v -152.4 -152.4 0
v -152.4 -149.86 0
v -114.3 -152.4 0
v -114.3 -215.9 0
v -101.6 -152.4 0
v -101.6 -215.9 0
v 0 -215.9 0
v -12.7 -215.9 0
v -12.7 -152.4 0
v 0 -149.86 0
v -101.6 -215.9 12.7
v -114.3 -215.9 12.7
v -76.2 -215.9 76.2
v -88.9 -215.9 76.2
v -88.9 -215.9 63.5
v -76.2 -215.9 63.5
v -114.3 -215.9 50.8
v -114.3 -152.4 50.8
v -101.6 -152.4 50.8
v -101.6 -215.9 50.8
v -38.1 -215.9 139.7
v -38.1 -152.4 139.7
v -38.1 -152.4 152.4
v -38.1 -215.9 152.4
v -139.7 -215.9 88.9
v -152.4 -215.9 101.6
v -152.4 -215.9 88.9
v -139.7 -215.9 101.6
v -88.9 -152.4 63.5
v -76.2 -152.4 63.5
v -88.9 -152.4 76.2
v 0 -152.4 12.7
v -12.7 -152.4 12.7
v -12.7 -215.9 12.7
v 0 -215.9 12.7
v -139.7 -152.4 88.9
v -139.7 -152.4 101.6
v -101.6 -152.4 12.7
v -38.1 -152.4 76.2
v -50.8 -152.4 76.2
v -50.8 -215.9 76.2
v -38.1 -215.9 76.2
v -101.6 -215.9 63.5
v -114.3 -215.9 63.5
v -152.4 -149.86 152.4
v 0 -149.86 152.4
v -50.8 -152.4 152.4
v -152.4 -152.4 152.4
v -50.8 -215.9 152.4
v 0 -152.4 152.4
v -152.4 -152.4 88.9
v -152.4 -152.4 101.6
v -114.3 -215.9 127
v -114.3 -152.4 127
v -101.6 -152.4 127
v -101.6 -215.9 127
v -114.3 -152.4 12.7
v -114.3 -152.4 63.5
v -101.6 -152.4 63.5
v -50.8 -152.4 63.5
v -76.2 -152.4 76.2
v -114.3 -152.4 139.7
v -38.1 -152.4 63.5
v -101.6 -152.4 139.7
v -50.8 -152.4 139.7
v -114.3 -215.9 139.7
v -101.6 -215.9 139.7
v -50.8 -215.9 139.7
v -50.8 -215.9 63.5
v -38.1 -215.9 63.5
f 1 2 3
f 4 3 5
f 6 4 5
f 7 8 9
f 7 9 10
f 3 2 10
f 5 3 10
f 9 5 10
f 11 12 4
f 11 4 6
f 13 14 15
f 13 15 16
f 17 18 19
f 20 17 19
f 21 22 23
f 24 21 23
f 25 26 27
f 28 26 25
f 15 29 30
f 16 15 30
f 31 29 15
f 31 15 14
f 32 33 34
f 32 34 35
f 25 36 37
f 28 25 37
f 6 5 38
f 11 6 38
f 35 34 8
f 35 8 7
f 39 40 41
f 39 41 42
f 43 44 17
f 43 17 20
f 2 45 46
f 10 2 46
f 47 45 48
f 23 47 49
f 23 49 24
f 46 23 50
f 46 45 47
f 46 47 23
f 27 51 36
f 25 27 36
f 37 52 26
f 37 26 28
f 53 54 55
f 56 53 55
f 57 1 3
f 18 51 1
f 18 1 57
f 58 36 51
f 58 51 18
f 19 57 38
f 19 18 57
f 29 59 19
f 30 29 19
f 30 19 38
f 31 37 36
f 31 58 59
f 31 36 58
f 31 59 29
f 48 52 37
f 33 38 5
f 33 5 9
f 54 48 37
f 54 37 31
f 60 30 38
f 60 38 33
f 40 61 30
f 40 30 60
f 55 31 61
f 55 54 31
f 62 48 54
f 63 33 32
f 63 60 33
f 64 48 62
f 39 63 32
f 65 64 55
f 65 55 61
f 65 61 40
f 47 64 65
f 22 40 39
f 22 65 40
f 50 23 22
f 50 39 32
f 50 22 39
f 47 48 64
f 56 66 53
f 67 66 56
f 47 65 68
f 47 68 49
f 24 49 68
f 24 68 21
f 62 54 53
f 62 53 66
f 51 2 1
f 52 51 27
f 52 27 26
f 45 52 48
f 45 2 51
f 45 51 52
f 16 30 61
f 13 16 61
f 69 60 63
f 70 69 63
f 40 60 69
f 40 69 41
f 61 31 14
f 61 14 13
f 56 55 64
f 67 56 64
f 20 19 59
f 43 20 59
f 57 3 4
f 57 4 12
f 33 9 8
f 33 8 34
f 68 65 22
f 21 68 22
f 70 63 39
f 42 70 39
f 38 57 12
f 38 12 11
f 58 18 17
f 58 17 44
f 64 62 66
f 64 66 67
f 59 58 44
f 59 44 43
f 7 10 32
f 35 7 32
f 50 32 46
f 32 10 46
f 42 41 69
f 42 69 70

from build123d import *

# Parameters (mm, degrees)
F0_W     = 152.4
F0_H     = 152.4
F1_DEPTH = 152.4
F2_W     = 12.7
F2_H     = 12.7
F3_DEPTH = 63.5
F4_DEPTH = 149.86


with BuildPart() as f1:
    # F0 (on Front) → F1 (new body)
    with BuildSketch(Plane.XZ):
        with Locations((-76.2, 76.2)):
            Rectangle(F0_W, F0_H)
    extrude(amount=F1_DEPTH)

    # F2 (on face) → F3 (join)
    with BuildSketch(Plane.XZ.offset(152.4)):
        with Locations((-6.35, 6.35)):
            Rectangle(F2_W, F2_H)
        with Locations((-107.95, 6.35)):
            Rectangle(F2_W, F2_H)
        with Locations((-107.95, 133.35)):
            Rectangle(F2_W, F2_H)
        with Locations((-44.45, 69.85)):
            Rectangle(F2_W, F2_H)
        with Locations((-107.95, 57.15)):
            Rectangle(F2_W, F2_H)
        with Locations((-44.45, 146.05)):
            Rectangle(F2_W, F2_H)
        with Locations((-146.05, 95.25)):
            Rectangle(F2_W, F2_H)
        with Locations((-82.55, 69.85)):
            Rectangle(F2_W, F2_H)
    extrude(amount=F3_DEPTH)

    # F0 (on Front) → F4 (cut)
    with BuildSketch(Plane.XZ):
        with Locations((-76.2, 76.2)):
            Rectangle(F0_W, F0_H)
    extrude(amount=F4_DEPTH, mode=Mode.SUBTRACT)


solid = f1.part
